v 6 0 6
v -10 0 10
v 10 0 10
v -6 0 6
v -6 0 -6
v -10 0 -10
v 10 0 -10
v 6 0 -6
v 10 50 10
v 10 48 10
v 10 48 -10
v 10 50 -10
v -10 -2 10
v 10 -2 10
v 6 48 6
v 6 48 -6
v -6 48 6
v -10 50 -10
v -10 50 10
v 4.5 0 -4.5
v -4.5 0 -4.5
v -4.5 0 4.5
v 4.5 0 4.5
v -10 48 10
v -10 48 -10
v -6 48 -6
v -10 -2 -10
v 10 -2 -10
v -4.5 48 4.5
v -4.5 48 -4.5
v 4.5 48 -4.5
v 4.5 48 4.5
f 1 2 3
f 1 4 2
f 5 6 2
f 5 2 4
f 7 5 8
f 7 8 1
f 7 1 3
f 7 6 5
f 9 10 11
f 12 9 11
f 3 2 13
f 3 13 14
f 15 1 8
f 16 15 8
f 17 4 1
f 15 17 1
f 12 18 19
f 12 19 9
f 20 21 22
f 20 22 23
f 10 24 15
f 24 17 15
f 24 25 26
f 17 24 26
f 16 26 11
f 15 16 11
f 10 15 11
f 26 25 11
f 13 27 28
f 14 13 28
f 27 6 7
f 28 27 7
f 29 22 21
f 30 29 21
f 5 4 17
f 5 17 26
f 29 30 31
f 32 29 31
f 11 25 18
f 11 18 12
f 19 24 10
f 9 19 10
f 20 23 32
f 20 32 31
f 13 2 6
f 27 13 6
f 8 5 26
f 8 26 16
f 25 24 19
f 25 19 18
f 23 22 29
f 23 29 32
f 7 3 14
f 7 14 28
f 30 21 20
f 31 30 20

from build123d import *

# Parameters (mm, degrees)
SKETCH1_W           = 12
SKETCH1_H           = 12
SKETCH1_W_2         = 9
SKETCH1_H_2         = 9
BOSS_EXTRUDE1_DEPTH = 48
SKETCH3_W           = 20
SKETCH3_H           = 20
BOSS_EXTRUDE2_DEPTH = 2
SKETCH4_W           = 20
SKETCH4_H           = 20
BOSS_EXTRUDE3_DEPTH = 2


with BuildPart() as part:
    # Sketch1 → Boss-Extrude1 (new body)
    with BuildSketch(Plane(origin=(0, 0, 0), x_dir=(1, 0, 0), z_dir=(0, 1, 0))):
        Rectangle(SKETCH1_W, SKETCH1_H)
        Rectangle(SKETCH1_W_2, SKETCH1_H_2, mode=Mode.SUBTRACT)
    extrude(amount=BOSS_EXTRUDE1_DEPTH)

    # Sketch3 → Boss-Extrude2 (add)
    with BuildSketch(Plane(origin=(0, 0, 0), x_dir=(1, 0, 0), z_dir=(0, 1, 0))):
        Rectangle(SKETCH3_W, SKETCH3_H)
    extrude(amount=-BOSS_EXTRUDE2_DEPTH)

    # Sketch4 → Boss-Extrude3 (add)
    with BuildSketch(Plane(origin=(0, 48, 0), x_dir=(1, 0, 0), z_dir=(0, 1, 0))):
        Rectangle(SKETCH4_W, SKETCH4_H)
    extrude(amount=BOSS_EXTRUDE3_DEPTH)


solid = part.part
